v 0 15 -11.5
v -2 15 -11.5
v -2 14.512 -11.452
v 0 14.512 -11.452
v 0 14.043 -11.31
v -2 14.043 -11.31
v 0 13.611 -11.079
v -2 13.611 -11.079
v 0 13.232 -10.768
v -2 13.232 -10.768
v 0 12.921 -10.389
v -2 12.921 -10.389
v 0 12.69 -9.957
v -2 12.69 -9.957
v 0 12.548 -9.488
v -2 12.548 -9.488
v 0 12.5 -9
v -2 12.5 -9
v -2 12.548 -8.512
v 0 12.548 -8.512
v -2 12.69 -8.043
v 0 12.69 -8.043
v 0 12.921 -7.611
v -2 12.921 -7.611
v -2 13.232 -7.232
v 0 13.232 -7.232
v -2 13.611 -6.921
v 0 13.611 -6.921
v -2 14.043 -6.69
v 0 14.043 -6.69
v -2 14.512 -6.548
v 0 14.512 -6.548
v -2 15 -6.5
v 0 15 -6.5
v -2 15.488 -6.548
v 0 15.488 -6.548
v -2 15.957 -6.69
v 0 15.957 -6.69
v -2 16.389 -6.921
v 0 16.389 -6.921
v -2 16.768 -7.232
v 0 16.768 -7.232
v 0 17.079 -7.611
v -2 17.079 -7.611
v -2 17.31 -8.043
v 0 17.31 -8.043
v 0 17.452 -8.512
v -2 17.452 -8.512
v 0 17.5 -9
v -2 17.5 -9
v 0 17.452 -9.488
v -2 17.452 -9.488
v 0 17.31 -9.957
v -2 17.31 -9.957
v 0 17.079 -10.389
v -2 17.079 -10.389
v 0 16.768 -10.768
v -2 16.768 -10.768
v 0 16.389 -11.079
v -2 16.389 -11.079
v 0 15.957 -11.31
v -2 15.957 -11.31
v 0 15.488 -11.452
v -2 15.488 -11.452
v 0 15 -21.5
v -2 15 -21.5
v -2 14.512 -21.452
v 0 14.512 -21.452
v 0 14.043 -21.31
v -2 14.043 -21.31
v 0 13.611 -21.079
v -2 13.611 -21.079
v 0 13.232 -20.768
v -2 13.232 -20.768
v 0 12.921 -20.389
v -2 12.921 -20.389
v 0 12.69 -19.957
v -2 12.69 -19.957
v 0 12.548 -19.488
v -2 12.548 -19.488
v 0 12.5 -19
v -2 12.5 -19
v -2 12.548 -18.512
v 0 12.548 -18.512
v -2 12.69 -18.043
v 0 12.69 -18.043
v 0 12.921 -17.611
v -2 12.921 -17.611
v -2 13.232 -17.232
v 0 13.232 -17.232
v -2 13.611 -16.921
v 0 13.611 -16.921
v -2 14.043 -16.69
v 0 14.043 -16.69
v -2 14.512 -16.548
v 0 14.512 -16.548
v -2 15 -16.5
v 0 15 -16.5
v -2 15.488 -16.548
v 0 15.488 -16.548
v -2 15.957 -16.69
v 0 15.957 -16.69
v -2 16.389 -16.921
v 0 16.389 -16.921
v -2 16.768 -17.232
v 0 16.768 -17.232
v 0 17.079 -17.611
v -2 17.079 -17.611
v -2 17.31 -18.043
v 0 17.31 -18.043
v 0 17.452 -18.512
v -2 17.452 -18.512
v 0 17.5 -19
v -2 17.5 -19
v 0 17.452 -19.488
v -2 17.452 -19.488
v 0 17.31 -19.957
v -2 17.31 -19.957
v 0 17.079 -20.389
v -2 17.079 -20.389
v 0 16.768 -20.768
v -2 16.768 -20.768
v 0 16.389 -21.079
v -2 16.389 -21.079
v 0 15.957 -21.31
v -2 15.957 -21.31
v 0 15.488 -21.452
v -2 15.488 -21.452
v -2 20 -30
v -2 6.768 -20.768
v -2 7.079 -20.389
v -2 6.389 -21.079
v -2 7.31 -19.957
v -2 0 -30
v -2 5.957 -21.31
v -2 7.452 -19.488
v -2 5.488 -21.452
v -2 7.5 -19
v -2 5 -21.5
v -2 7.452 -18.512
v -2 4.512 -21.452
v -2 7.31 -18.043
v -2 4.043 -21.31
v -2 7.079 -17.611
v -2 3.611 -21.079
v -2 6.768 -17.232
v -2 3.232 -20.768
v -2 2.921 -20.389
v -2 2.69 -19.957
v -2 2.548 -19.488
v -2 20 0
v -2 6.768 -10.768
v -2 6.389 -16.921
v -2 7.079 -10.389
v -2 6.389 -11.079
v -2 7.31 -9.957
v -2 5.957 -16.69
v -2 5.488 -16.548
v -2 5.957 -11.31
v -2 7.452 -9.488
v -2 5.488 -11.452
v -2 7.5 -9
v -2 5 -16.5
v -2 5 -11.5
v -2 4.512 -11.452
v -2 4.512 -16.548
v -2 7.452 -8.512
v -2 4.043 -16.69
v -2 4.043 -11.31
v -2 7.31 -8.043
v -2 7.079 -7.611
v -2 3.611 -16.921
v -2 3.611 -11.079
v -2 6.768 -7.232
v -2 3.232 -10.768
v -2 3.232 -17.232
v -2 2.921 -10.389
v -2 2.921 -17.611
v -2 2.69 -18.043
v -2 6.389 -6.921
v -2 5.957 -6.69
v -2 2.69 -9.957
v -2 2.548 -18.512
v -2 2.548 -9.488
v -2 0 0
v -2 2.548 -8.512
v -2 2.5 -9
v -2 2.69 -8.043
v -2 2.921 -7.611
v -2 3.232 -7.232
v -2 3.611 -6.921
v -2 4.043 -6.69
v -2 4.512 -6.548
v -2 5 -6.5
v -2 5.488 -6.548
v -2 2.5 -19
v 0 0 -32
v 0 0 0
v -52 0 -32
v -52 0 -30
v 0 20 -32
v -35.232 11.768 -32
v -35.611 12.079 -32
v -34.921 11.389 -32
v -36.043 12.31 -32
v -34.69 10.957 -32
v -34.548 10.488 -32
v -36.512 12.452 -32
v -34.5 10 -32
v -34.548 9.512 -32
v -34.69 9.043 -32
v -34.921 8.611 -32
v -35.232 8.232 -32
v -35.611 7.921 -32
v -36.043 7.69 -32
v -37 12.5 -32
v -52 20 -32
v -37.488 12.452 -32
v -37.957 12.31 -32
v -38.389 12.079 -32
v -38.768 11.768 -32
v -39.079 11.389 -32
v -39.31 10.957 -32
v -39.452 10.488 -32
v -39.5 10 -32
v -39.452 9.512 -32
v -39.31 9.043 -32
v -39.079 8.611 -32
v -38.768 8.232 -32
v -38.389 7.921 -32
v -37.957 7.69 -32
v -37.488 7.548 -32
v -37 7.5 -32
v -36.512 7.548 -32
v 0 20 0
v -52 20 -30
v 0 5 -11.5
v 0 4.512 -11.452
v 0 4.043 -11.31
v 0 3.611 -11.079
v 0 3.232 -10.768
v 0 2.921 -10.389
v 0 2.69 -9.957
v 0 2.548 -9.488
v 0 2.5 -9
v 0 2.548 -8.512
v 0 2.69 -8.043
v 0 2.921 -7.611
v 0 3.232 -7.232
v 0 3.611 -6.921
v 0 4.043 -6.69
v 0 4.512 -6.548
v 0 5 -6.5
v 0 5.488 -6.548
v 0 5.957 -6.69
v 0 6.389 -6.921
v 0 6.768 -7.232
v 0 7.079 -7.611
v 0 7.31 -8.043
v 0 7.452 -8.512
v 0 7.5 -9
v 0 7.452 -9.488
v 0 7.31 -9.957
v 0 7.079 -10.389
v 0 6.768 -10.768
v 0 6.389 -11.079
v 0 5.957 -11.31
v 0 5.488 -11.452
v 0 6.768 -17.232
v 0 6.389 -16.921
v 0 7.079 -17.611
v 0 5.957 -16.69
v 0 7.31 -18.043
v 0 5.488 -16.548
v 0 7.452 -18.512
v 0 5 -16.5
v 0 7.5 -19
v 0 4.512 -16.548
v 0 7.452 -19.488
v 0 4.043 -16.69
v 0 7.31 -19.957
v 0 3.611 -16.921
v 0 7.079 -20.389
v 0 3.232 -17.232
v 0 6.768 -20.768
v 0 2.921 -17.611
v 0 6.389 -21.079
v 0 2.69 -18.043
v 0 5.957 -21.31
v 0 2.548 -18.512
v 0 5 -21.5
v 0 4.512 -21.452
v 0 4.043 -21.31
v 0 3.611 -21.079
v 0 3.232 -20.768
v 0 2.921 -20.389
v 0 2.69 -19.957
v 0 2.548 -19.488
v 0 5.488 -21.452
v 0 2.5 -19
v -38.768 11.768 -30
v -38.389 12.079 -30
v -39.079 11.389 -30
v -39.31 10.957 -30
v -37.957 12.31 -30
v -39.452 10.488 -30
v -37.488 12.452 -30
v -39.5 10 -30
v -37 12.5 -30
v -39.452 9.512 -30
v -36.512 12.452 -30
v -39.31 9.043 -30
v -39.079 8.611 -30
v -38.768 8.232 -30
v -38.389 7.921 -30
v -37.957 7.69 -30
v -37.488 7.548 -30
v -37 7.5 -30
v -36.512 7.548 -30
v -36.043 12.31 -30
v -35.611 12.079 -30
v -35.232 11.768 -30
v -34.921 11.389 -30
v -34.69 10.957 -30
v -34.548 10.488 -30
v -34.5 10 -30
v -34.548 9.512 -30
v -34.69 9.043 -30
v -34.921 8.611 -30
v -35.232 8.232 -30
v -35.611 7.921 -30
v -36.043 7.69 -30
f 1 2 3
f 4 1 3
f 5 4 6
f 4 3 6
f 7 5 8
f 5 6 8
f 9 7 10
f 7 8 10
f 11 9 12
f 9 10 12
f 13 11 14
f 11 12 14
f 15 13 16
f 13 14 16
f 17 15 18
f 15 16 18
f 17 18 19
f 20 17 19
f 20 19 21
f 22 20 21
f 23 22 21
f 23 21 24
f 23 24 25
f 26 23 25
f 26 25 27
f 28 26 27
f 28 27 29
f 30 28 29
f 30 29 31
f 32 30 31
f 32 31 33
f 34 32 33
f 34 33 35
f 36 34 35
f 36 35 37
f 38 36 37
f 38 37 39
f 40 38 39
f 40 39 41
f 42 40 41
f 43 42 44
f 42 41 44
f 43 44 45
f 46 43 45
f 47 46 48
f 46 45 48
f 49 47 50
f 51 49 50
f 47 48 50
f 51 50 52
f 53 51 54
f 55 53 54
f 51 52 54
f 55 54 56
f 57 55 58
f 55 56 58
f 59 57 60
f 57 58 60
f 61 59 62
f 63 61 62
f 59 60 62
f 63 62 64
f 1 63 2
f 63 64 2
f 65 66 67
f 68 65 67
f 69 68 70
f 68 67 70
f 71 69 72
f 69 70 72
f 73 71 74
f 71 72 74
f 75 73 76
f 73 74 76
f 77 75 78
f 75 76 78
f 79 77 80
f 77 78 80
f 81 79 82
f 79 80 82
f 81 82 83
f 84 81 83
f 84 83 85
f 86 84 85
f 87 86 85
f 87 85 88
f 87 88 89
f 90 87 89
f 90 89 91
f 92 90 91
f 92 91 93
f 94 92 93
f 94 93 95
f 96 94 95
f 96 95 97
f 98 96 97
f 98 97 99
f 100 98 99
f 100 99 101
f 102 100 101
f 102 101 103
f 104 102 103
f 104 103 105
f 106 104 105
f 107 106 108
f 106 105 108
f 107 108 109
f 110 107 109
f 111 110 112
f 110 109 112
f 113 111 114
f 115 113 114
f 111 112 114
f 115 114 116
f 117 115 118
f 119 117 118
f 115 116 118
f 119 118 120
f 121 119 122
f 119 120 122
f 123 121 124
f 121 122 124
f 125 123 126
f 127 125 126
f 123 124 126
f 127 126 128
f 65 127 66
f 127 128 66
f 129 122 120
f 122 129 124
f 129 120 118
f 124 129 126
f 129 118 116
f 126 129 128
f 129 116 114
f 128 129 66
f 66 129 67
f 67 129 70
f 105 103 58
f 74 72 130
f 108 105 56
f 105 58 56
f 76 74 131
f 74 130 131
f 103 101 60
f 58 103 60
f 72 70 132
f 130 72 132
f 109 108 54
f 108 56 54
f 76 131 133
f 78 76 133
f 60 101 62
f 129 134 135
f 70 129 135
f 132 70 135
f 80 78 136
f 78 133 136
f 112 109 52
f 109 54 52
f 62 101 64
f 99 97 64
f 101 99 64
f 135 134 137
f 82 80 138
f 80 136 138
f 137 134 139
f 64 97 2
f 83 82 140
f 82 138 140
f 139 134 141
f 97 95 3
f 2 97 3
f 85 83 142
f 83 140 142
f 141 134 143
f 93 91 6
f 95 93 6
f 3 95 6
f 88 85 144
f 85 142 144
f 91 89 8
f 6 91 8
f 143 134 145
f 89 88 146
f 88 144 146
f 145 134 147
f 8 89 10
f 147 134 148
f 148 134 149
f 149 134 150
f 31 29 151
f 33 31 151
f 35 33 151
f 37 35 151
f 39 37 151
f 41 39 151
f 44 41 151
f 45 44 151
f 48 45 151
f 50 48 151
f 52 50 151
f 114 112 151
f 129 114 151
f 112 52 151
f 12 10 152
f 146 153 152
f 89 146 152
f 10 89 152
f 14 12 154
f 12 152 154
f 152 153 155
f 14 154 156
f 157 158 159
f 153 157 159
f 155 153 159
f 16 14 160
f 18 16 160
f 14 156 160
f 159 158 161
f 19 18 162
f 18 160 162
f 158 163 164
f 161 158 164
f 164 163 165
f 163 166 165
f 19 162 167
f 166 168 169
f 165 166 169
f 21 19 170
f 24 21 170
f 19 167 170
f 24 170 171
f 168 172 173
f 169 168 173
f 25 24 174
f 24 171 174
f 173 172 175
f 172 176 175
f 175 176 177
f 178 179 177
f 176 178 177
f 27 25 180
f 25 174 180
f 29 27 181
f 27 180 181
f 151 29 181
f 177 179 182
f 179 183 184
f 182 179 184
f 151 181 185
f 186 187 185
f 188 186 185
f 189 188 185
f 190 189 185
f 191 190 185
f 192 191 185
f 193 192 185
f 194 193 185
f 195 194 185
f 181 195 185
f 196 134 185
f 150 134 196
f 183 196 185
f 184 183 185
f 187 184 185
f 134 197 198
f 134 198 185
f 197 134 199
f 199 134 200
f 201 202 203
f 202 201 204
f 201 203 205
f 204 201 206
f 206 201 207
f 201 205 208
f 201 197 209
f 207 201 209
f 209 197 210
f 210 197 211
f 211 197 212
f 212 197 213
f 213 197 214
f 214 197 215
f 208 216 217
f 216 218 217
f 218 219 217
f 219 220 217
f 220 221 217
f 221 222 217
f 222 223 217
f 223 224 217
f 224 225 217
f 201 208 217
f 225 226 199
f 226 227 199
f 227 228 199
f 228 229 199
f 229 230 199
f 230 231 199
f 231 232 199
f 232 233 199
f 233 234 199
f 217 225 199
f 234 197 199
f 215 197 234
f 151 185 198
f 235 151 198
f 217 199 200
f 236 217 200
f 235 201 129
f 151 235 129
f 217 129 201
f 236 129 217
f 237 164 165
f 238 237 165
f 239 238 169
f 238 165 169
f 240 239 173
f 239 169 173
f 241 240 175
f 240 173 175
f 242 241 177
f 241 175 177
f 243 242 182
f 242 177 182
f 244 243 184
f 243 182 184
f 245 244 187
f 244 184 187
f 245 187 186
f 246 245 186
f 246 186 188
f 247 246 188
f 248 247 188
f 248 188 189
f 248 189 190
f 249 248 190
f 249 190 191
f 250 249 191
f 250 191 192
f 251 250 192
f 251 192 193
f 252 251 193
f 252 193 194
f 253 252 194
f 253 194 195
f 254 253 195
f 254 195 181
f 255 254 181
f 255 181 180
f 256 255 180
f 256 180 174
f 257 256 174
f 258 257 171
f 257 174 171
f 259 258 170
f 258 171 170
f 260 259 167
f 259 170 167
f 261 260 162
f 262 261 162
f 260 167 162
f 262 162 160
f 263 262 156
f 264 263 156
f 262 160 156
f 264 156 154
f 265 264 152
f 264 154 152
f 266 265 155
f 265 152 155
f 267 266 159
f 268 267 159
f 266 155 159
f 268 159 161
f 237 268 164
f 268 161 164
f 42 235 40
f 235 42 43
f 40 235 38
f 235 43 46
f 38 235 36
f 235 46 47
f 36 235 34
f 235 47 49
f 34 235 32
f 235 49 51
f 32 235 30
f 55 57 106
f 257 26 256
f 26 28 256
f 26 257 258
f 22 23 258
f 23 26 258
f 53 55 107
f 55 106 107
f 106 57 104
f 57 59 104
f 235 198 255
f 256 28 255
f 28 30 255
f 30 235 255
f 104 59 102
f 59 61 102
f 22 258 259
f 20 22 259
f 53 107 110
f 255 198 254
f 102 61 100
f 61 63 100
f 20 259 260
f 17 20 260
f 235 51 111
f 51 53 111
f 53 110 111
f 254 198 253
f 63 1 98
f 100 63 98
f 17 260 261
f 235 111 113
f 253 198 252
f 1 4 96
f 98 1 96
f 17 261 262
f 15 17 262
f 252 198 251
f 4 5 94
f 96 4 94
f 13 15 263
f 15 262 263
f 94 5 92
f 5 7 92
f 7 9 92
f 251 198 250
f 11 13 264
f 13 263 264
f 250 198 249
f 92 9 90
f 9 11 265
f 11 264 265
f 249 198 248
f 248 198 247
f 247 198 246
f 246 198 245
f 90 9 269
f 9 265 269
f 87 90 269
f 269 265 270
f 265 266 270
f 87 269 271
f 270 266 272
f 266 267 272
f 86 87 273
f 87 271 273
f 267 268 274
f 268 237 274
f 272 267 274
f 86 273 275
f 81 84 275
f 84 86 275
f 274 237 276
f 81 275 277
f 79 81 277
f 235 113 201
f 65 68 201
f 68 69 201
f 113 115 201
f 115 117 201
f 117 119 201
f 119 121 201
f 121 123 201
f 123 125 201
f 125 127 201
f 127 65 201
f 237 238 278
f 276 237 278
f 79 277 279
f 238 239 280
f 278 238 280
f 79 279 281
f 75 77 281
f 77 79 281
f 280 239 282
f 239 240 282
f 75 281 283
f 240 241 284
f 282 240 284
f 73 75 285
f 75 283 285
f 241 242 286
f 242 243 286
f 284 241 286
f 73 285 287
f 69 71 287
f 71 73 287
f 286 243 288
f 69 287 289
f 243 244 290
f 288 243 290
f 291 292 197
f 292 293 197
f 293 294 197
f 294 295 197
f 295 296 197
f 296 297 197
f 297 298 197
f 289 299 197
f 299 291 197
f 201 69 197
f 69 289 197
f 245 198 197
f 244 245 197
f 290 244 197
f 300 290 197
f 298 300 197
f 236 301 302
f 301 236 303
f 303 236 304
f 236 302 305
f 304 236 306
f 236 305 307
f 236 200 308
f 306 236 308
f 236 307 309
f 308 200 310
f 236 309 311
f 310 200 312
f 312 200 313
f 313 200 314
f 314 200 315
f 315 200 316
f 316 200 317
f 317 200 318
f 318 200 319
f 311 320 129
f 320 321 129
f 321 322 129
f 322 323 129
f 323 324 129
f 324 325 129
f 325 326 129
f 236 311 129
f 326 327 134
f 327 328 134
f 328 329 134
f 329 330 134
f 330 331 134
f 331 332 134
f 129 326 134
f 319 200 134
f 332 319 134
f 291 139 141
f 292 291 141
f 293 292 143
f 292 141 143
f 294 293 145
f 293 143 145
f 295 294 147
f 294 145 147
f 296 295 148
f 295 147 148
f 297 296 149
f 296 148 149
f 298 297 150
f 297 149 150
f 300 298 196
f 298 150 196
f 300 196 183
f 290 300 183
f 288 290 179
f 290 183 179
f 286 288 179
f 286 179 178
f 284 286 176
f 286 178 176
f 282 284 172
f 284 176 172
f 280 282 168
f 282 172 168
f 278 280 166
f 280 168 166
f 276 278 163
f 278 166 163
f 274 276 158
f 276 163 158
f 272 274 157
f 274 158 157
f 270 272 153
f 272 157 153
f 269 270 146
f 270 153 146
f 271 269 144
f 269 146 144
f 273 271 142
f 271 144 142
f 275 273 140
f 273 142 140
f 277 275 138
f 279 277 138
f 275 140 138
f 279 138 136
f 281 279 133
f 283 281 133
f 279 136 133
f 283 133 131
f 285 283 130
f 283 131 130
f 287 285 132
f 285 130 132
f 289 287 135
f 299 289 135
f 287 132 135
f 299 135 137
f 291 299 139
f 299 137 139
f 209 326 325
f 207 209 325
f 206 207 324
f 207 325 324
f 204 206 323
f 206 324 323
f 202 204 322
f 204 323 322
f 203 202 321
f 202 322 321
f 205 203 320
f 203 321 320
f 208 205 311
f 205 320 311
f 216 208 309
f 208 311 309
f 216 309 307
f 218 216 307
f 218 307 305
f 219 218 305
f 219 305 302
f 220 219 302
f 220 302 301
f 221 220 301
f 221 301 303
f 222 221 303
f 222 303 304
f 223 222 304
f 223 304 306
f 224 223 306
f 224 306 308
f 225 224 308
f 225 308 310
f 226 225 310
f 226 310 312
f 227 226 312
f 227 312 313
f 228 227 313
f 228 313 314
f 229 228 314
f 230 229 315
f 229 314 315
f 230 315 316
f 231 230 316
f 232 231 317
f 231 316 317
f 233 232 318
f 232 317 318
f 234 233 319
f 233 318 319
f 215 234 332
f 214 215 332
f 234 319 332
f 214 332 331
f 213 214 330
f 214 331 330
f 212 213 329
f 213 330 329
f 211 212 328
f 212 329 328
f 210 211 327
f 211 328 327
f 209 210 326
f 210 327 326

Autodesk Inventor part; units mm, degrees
ref_plane "YZ Plane" through (0, 0, 0) normal (1, 0, 0) x (0, 1, 0)
ref_plane "XZ Plane" through (0, 0, 0) normal (0, 1, 0) x (-1, 0, 0)
ref_plane "XY Plane" through (0, 0, 0) normal (0, 0, 1) x (1, 0, 0)
sketch "Sketch1" plane through (0, 0, 0) normal (0, 1, 0) x (-1, 0, 0)
  line L0 (0, 0) -> (0, -32)
  line L1 (0, -32) -> (52, -32)
  line L2 (52, -32) -> (52, -30)
  line L3 (52, -30) -> (2, -30)
  line L4 (2, -30) -> (2, 0)
  line L5 (2, 0) -> (0, 0)
  dimension "d0" = 2
  dimension "d1" = 2
  dimension "d2" = 50
  dimension "d3" = 30
extrude "base" add sketch "Sketch1" along normal blind 20
sketch "Sketch2" plane through (-52, 0, -30) normal (0, 0, 1) x (1, 0, 0)
  line L0 (0, 0) -> (50, 0) construction
  line L1 (50, 0) -> (50, 20) construction
  line L2 (0, 20) -> (50, 20) construction
  line L3 (0, 0) -> (0, 20) construction
  line L4 (0, 0) -> (50, 0) construction
  line L5 (52, 20) -> (0, 20) construction
  circle A0 centre (15, 10) radius 2.5
  line L6 (0, 0) -> (0, 20) projected
  line L7 (0, 10) -> (52, 10)
  line L8 (52, 0) -> (52, 20) projected
  dimension "d6" = 5
  dimension "d9" = 15
extrude "shaftHole" cut sketch "Sketch2" against normal blind 30
sketch "Sketch4" plane through (0, 0, 0) normal (1, 0, 0) x (0, 0, -1)
  line L0 (32, 0) -> (32, 20) construction
  line L1 (0, 0) -> (0, 20) construction
  line L2 (30, 0) -> (30, 20) construction
  line L3 (0, 10) -> (30, 10) construction
  line L4 (9, 5) -> (9, 15) construction
  line L5 (19, 15) -> (19, 5) construction
  point P0 (9, 10)
  point P1 (19, 10)
  dimension "d22" = 30
  dimension "d29" = 10
  dimension "d30" = 9
  dimension "d31" = 10
  dimension "d32" = 10
hole "Hole1" at (0, 5, -9) at (0, 15, -9) at (0, 15, -19) at (0, 5, -19) direction (-1, 0, 0) diameter 5 end through all
equation "\"d1\" = d0"
equation "\"d31\" = d29"
properties part number "motorBracket" material "Steel"
